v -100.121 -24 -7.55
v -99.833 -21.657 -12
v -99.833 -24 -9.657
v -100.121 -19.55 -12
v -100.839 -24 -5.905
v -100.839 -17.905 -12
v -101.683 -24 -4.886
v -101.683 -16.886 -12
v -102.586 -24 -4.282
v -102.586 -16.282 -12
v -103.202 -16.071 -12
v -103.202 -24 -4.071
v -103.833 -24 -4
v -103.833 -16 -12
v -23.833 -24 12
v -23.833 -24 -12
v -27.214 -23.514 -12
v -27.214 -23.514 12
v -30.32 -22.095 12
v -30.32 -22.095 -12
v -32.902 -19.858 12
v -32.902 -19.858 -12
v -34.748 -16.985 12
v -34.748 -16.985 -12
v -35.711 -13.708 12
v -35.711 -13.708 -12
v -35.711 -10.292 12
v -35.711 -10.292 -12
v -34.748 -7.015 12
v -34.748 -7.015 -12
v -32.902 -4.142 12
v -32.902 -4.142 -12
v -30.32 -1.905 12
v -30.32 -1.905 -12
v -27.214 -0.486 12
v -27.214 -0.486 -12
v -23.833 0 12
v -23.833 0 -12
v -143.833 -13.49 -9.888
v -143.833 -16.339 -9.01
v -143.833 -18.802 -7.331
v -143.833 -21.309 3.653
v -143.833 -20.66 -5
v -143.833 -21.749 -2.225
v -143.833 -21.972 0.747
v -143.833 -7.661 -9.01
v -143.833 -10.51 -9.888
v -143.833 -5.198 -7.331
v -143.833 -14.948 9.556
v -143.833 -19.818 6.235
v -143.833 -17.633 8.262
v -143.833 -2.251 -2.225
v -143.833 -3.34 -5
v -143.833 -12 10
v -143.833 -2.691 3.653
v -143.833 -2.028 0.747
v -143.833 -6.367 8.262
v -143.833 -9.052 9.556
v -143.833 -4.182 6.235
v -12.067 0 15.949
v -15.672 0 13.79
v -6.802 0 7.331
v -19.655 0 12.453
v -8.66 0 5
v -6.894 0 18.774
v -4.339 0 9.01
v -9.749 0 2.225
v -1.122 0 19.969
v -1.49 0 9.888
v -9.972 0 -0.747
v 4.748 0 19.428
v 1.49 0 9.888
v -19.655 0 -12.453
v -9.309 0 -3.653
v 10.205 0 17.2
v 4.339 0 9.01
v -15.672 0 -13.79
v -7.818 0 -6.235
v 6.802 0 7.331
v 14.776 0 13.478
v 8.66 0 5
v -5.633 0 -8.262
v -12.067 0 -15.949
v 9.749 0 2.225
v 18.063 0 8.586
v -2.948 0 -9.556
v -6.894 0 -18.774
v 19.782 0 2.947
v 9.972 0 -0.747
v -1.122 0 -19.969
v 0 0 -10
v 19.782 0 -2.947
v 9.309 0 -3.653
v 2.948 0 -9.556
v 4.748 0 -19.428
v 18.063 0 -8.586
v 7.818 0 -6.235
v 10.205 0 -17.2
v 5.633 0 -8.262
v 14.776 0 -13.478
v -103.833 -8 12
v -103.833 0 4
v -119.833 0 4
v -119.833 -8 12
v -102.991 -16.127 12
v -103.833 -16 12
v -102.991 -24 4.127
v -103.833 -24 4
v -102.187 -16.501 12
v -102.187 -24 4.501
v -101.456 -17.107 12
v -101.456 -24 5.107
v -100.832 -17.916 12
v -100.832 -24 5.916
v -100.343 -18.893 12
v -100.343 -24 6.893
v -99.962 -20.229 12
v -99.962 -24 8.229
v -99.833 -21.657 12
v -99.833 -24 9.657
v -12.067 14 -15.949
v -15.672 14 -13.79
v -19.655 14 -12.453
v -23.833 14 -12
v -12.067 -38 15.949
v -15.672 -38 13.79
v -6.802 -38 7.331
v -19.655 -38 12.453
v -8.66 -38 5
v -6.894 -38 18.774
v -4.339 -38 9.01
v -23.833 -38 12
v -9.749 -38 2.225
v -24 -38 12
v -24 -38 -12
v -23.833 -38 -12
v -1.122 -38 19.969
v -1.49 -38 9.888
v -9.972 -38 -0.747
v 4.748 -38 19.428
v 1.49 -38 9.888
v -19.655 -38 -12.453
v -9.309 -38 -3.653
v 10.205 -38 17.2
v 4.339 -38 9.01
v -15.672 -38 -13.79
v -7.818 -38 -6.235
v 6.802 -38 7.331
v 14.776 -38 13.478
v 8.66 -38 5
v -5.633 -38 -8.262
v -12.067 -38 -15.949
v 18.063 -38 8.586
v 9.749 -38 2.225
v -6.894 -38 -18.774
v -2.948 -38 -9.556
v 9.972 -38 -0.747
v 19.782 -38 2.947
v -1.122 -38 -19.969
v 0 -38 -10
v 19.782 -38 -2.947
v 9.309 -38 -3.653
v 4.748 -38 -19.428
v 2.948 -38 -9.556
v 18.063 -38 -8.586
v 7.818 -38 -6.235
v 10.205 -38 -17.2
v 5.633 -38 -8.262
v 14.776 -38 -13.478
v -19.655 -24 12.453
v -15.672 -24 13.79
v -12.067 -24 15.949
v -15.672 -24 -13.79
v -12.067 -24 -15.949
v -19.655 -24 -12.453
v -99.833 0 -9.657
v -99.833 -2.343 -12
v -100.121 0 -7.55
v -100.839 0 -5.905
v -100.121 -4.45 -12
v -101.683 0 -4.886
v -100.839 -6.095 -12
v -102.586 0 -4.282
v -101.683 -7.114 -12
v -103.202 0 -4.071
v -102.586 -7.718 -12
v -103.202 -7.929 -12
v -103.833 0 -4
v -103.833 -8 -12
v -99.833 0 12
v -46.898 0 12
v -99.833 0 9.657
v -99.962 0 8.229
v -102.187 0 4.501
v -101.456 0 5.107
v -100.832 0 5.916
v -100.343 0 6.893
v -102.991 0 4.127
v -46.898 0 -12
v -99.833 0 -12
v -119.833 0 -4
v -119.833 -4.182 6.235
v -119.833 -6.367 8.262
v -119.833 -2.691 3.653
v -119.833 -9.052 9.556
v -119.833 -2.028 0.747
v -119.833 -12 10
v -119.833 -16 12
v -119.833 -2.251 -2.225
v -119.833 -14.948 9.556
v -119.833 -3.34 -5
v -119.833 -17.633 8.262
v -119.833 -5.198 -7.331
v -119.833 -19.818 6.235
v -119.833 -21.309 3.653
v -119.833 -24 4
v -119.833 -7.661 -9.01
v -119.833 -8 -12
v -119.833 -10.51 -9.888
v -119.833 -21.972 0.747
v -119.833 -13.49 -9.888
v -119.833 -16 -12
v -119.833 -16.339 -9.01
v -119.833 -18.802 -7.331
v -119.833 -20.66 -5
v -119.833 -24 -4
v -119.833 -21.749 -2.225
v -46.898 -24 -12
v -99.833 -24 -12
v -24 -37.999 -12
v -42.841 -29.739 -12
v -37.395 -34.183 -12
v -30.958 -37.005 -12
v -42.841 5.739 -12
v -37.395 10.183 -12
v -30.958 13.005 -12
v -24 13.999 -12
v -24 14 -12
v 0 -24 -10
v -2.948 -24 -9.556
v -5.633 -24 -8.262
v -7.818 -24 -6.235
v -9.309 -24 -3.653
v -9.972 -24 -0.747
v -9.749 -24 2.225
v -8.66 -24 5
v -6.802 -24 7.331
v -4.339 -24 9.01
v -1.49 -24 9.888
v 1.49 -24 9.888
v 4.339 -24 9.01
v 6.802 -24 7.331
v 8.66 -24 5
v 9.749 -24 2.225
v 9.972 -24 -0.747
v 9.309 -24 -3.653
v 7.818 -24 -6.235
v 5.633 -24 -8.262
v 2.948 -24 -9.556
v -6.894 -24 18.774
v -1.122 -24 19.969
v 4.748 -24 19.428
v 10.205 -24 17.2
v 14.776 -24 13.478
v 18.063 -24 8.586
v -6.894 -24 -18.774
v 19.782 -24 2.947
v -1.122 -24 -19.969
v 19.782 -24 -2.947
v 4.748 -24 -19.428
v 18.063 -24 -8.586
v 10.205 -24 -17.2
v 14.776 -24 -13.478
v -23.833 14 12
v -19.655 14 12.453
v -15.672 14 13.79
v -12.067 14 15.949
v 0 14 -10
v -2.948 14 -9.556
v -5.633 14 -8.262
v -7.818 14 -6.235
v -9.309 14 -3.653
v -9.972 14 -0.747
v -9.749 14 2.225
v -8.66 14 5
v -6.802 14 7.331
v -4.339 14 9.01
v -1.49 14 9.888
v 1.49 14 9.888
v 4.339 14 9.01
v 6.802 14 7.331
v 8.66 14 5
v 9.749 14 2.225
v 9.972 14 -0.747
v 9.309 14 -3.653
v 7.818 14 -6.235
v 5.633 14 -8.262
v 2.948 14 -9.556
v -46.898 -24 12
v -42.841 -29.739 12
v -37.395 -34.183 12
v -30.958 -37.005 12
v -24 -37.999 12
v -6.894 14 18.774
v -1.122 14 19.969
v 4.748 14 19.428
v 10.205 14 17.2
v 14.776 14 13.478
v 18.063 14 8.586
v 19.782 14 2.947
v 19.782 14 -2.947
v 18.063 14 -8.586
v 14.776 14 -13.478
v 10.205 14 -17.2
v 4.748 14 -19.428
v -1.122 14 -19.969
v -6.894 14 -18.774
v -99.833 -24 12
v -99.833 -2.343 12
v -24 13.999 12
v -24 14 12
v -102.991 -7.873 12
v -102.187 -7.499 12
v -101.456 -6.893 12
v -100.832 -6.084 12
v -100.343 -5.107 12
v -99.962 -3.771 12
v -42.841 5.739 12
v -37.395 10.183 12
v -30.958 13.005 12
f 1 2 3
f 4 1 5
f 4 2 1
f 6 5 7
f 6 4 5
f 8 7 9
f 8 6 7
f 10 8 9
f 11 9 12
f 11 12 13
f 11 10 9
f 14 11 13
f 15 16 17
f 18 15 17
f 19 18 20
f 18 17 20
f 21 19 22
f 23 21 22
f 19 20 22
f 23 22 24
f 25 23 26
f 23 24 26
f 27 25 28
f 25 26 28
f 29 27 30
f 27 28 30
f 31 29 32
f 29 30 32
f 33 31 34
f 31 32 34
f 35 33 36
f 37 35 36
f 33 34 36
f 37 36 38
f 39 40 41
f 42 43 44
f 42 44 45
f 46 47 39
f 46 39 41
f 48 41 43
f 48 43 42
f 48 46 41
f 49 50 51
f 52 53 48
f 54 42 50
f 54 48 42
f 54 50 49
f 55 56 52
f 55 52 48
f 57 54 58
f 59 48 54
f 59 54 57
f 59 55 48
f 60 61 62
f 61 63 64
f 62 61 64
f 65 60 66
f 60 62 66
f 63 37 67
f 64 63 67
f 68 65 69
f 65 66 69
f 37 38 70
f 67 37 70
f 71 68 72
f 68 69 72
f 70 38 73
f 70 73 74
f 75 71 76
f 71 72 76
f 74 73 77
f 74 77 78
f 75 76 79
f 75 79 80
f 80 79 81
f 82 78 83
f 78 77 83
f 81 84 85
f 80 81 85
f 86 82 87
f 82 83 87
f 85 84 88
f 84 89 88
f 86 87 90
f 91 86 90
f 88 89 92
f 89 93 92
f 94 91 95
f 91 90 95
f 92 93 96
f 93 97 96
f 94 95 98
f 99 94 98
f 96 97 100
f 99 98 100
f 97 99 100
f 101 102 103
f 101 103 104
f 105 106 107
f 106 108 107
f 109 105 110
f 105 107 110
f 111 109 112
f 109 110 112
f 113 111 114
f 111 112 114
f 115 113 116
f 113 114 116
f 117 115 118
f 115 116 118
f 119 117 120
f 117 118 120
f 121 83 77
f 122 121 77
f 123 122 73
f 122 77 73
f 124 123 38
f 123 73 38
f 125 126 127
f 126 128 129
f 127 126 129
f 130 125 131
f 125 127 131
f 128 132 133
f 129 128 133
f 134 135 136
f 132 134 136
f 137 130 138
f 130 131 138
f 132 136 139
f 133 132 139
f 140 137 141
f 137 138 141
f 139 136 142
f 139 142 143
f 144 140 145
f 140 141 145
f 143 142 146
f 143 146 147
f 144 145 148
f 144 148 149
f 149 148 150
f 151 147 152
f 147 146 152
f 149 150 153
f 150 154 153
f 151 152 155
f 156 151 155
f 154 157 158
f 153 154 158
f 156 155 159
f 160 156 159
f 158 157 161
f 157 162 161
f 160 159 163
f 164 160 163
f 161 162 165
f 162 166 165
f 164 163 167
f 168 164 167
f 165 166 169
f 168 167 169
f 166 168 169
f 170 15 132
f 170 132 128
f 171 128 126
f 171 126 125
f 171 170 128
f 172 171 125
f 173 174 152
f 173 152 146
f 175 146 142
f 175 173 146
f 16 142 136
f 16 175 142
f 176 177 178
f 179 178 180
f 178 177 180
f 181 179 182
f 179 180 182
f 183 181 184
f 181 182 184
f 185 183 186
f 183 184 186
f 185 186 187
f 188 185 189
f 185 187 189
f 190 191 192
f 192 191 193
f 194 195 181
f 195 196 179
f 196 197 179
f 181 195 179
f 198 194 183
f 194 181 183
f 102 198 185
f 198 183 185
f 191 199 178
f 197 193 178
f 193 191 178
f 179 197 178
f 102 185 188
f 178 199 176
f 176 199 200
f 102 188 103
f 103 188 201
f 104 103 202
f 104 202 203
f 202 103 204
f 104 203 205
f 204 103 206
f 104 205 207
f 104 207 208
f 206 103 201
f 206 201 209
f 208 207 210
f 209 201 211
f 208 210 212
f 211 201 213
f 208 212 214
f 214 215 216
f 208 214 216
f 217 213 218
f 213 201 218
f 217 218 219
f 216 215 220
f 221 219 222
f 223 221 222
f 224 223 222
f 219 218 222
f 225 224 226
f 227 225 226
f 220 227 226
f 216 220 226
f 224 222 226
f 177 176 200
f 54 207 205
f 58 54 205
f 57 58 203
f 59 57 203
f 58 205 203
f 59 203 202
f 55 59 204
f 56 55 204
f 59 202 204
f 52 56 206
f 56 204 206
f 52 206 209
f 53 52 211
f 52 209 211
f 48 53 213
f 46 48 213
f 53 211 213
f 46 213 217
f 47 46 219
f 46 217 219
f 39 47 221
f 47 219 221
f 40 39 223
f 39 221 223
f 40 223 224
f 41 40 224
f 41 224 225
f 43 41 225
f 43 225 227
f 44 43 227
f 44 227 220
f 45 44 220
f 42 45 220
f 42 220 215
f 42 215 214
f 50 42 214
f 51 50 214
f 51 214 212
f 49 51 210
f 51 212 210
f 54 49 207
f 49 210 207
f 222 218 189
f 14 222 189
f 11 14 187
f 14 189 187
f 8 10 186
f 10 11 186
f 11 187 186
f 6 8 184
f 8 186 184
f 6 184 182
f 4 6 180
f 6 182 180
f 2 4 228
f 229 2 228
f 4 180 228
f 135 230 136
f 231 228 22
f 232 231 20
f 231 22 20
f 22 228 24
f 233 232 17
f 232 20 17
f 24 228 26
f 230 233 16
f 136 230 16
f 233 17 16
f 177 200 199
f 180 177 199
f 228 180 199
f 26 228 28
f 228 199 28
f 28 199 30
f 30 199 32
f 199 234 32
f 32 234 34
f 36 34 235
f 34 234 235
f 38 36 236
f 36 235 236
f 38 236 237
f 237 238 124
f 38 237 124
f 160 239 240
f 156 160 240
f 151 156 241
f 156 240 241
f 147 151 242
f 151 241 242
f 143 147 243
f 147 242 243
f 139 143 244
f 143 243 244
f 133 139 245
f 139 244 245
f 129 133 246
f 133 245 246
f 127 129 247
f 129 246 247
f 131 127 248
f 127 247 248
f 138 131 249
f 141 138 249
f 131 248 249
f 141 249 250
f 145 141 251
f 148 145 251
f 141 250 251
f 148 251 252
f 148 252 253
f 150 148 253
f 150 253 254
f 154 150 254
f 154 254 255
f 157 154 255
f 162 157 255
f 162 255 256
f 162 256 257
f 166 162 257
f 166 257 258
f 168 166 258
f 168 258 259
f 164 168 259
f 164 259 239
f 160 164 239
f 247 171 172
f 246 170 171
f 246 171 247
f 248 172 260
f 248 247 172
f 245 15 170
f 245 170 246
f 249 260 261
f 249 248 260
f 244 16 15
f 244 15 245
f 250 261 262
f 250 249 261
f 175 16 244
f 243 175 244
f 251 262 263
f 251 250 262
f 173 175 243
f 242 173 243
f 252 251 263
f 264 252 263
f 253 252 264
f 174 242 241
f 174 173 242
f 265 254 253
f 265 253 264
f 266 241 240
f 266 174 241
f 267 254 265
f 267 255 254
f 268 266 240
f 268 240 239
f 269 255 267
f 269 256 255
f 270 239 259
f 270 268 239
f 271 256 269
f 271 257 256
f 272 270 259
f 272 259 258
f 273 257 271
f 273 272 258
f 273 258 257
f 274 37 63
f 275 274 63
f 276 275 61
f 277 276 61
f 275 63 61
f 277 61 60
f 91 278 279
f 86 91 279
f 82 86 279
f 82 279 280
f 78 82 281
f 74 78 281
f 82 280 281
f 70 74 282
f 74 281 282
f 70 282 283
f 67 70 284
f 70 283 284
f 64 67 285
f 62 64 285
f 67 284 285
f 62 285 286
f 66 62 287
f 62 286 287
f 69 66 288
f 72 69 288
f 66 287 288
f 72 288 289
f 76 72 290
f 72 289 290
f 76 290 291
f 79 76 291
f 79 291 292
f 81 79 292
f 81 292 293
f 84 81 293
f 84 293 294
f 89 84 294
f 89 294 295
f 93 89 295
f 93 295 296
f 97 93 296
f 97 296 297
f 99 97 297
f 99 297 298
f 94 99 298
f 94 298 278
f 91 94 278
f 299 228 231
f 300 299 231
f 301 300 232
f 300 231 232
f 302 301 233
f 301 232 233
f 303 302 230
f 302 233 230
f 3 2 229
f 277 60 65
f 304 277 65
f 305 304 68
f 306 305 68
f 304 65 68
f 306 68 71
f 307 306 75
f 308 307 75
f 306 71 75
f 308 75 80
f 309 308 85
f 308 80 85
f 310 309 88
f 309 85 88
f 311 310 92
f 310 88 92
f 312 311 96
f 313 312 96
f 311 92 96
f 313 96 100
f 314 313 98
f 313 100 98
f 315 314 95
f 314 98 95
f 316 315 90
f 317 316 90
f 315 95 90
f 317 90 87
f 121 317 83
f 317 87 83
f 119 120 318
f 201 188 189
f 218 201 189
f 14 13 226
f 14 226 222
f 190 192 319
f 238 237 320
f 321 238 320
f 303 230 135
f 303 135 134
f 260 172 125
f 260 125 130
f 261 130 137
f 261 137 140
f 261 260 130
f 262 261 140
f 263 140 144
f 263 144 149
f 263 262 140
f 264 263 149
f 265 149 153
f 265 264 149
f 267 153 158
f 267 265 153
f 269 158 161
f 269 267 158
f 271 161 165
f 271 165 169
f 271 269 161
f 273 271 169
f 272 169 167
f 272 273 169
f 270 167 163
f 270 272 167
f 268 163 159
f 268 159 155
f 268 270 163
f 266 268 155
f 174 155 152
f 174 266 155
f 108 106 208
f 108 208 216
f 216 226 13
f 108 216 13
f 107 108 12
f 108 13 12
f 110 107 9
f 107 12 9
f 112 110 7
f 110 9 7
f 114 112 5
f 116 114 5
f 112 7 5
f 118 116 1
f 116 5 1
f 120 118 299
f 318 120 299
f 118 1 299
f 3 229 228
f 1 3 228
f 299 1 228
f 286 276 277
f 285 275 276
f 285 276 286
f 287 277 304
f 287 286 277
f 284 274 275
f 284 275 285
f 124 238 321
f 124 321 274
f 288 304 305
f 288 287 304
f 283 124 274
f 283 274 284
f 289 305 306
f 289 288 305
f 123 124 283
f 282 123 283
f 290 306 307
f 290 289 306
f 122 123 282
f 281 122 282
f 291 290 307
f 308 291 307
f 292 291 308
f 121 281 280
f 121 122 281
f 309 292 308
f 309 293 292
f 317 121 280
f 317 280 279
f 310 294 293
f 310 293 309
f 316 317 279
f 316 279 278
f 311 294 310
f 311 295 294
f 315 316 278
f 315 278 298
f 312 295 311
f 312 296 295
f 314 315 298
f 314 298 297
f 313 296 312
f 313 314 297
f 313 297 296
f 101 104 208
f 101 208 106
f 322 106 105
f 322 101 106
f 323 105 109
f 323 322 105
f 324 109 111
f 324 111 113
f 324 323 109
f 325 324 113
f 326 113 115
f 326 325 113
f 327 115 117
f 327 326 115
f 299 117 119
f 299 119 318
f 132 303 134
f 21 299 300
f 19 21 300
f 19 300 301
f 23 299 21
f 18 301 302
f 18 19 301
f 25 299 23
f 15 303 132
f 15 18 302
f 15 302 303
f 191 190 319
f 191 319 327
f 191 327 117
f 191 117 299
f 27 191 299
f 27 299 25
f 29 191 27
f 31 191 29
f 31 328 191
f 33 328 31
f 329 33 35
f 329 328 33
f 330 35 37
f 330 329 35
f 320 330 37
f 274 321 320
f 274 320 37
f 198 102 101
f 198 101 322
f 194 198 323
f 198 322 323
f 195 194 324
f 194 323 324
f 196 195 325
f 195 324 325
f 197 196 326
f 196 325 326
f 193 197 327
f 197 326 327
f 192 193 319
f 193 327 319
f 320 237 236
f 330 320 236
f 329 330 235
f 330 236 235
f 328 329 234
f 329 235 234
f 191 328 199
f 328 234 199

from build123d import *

# Parameters (mm, degrees)
BOSS_EXTRUDE1_DEPTH      = 14
BOSS_EXTRUDE2_DEPTH      = 12
BOSS_EXTRUDE2_DEPTH_BACK = 12
CUT_EXTRUDE1_DEPTH       = 20
FILLET1_R                = 4
SKETCH5_R                = 10
BOSS_EXTRUDE3_DEPTH      = 24
SKETCH6_R                = 10
CUT_EXTRUDE2_DEPTH       = 78


with BuildPart() as part:
    # Sketch1 → Boss-Extrude1 (new body)
    with BuildSketch(Plane(origin=(0, 0, 0), x_dir=(1, 0, 0), z_dir=(0, 1, 0))):
        with BuildLine():
            Line((-24, 12), (-24, -12))
            Line((-24, -12), (-23.832750576, -12))
            ThreePointArc((-23.832750576, -12), (-17.627403759, -13.013689636), (-12.067215481, -15.949367089))
            ThreePointArc((-12.067215481, -15.949367089), (20, 0), (-12.067215481, 15.949367089))
            ThreePointArc((-12.067215481, 15.949367089), (-17.627403759, 13.013689636), (-23.832750576, 12))
            Line((-23.832750576, 12), (-24, 12))
        make_face()
    boss_extrude1 = extrude(amount=BOSS_EXTRUDE1_DEPTH)

    # Sketch3 → Boss-Extrude2 (add, two sides: drawn at the far end of the back side and taken through both)
    with BuildSketch(Plane.XY.offset(-BOSS_EXTRUDE2_DEPTH_BACK)):
        with BuildLine():
            Line((-46.897875765, 0), (-119.832750576, 0))
            Line((-119.832750576, 0), (-119.832750576, -24))
            Line((-119.832750576, -24), (-46.897875765, -24))
            ThreePointArc((-46.897875765, -24), (-37.323488139, -34.226110771), (-23.832750576, -38))
            Line((-23.832750576, -38), (-23.832750576, -24))
            ThreePointArc((-23.832750576, -24), (-35.832750576, -12), (-23.832750576, 0))
            Line((-23.832750576, 0), (-23.832750576, 14))
            ThreePointArc((-23.832750576, 14), (-37.323488139, 10.226110771), (-46.897875765, 0))
        make_face()
    extrude(amount=BOSS_EXTRUDE2_DEPTH + BOSS_EXTRUDE2_DEPTH_BACK)

    # Sketch4 → Cut-Extrude1 (cut)
    with BuildSketch(Plane.ZY.offset(119.832750576)):
        Polygon((-12, 0), (-4, 0), (-12, -8), align=None)
        Polygon((4, 0), (12, -8), (12, 0), align=None)
        Polygon((12, -16), (4, -24), (12, -24), align=None)
        Polygon((-4, -24), (-12, -16), (-12, -24), align=None)
    extrude(amount=-CUT_EXTRUDE1_DEPTH, mode=Mode.SUBTRACT)

    # Fillet1
    fillet1_edges = [part.edges().sort_by_distance(p)[0] for p in [
        (-99.832750576, -20, -8),
        (-99.832750576, -20, 8),
        (-99.832750576, -4, 8),
        (-99.832750576, -4, -8),
    ]]
    fillet(fillet1_edges, radius=FILLET1_R)

    # Sketch5 → Boss-Extrude3 (add)
    with BuildSketch(Plane.ZY.offset(119.832750576)):
        with Locations((0, -12)):
            Circle(SKETCH5_R)
    extrude(amount=BOSS_EXTRUDE3_DEPTH)

    # Mirror1: Boss-Extrude1 across plane
    add(boss_extrude1.mirror(Plane.ZX.offset(-12)))

    # Sketch6 → Cut-Extrude2 (cut)
    with BuildSketch(Plane(origin=(0, 14, 0), x_dir=(1, 0, 0), z_dir=(0, 1, 0))):
        with Locations(Location((0, 0, 0), (0, 0, 90))):
            Circle(SKETCH6_R)
    extrude(amount=-CUT_EXTRUDE2_DEPTH, mode=Mode.SUBTRACT)


solid = part.part
